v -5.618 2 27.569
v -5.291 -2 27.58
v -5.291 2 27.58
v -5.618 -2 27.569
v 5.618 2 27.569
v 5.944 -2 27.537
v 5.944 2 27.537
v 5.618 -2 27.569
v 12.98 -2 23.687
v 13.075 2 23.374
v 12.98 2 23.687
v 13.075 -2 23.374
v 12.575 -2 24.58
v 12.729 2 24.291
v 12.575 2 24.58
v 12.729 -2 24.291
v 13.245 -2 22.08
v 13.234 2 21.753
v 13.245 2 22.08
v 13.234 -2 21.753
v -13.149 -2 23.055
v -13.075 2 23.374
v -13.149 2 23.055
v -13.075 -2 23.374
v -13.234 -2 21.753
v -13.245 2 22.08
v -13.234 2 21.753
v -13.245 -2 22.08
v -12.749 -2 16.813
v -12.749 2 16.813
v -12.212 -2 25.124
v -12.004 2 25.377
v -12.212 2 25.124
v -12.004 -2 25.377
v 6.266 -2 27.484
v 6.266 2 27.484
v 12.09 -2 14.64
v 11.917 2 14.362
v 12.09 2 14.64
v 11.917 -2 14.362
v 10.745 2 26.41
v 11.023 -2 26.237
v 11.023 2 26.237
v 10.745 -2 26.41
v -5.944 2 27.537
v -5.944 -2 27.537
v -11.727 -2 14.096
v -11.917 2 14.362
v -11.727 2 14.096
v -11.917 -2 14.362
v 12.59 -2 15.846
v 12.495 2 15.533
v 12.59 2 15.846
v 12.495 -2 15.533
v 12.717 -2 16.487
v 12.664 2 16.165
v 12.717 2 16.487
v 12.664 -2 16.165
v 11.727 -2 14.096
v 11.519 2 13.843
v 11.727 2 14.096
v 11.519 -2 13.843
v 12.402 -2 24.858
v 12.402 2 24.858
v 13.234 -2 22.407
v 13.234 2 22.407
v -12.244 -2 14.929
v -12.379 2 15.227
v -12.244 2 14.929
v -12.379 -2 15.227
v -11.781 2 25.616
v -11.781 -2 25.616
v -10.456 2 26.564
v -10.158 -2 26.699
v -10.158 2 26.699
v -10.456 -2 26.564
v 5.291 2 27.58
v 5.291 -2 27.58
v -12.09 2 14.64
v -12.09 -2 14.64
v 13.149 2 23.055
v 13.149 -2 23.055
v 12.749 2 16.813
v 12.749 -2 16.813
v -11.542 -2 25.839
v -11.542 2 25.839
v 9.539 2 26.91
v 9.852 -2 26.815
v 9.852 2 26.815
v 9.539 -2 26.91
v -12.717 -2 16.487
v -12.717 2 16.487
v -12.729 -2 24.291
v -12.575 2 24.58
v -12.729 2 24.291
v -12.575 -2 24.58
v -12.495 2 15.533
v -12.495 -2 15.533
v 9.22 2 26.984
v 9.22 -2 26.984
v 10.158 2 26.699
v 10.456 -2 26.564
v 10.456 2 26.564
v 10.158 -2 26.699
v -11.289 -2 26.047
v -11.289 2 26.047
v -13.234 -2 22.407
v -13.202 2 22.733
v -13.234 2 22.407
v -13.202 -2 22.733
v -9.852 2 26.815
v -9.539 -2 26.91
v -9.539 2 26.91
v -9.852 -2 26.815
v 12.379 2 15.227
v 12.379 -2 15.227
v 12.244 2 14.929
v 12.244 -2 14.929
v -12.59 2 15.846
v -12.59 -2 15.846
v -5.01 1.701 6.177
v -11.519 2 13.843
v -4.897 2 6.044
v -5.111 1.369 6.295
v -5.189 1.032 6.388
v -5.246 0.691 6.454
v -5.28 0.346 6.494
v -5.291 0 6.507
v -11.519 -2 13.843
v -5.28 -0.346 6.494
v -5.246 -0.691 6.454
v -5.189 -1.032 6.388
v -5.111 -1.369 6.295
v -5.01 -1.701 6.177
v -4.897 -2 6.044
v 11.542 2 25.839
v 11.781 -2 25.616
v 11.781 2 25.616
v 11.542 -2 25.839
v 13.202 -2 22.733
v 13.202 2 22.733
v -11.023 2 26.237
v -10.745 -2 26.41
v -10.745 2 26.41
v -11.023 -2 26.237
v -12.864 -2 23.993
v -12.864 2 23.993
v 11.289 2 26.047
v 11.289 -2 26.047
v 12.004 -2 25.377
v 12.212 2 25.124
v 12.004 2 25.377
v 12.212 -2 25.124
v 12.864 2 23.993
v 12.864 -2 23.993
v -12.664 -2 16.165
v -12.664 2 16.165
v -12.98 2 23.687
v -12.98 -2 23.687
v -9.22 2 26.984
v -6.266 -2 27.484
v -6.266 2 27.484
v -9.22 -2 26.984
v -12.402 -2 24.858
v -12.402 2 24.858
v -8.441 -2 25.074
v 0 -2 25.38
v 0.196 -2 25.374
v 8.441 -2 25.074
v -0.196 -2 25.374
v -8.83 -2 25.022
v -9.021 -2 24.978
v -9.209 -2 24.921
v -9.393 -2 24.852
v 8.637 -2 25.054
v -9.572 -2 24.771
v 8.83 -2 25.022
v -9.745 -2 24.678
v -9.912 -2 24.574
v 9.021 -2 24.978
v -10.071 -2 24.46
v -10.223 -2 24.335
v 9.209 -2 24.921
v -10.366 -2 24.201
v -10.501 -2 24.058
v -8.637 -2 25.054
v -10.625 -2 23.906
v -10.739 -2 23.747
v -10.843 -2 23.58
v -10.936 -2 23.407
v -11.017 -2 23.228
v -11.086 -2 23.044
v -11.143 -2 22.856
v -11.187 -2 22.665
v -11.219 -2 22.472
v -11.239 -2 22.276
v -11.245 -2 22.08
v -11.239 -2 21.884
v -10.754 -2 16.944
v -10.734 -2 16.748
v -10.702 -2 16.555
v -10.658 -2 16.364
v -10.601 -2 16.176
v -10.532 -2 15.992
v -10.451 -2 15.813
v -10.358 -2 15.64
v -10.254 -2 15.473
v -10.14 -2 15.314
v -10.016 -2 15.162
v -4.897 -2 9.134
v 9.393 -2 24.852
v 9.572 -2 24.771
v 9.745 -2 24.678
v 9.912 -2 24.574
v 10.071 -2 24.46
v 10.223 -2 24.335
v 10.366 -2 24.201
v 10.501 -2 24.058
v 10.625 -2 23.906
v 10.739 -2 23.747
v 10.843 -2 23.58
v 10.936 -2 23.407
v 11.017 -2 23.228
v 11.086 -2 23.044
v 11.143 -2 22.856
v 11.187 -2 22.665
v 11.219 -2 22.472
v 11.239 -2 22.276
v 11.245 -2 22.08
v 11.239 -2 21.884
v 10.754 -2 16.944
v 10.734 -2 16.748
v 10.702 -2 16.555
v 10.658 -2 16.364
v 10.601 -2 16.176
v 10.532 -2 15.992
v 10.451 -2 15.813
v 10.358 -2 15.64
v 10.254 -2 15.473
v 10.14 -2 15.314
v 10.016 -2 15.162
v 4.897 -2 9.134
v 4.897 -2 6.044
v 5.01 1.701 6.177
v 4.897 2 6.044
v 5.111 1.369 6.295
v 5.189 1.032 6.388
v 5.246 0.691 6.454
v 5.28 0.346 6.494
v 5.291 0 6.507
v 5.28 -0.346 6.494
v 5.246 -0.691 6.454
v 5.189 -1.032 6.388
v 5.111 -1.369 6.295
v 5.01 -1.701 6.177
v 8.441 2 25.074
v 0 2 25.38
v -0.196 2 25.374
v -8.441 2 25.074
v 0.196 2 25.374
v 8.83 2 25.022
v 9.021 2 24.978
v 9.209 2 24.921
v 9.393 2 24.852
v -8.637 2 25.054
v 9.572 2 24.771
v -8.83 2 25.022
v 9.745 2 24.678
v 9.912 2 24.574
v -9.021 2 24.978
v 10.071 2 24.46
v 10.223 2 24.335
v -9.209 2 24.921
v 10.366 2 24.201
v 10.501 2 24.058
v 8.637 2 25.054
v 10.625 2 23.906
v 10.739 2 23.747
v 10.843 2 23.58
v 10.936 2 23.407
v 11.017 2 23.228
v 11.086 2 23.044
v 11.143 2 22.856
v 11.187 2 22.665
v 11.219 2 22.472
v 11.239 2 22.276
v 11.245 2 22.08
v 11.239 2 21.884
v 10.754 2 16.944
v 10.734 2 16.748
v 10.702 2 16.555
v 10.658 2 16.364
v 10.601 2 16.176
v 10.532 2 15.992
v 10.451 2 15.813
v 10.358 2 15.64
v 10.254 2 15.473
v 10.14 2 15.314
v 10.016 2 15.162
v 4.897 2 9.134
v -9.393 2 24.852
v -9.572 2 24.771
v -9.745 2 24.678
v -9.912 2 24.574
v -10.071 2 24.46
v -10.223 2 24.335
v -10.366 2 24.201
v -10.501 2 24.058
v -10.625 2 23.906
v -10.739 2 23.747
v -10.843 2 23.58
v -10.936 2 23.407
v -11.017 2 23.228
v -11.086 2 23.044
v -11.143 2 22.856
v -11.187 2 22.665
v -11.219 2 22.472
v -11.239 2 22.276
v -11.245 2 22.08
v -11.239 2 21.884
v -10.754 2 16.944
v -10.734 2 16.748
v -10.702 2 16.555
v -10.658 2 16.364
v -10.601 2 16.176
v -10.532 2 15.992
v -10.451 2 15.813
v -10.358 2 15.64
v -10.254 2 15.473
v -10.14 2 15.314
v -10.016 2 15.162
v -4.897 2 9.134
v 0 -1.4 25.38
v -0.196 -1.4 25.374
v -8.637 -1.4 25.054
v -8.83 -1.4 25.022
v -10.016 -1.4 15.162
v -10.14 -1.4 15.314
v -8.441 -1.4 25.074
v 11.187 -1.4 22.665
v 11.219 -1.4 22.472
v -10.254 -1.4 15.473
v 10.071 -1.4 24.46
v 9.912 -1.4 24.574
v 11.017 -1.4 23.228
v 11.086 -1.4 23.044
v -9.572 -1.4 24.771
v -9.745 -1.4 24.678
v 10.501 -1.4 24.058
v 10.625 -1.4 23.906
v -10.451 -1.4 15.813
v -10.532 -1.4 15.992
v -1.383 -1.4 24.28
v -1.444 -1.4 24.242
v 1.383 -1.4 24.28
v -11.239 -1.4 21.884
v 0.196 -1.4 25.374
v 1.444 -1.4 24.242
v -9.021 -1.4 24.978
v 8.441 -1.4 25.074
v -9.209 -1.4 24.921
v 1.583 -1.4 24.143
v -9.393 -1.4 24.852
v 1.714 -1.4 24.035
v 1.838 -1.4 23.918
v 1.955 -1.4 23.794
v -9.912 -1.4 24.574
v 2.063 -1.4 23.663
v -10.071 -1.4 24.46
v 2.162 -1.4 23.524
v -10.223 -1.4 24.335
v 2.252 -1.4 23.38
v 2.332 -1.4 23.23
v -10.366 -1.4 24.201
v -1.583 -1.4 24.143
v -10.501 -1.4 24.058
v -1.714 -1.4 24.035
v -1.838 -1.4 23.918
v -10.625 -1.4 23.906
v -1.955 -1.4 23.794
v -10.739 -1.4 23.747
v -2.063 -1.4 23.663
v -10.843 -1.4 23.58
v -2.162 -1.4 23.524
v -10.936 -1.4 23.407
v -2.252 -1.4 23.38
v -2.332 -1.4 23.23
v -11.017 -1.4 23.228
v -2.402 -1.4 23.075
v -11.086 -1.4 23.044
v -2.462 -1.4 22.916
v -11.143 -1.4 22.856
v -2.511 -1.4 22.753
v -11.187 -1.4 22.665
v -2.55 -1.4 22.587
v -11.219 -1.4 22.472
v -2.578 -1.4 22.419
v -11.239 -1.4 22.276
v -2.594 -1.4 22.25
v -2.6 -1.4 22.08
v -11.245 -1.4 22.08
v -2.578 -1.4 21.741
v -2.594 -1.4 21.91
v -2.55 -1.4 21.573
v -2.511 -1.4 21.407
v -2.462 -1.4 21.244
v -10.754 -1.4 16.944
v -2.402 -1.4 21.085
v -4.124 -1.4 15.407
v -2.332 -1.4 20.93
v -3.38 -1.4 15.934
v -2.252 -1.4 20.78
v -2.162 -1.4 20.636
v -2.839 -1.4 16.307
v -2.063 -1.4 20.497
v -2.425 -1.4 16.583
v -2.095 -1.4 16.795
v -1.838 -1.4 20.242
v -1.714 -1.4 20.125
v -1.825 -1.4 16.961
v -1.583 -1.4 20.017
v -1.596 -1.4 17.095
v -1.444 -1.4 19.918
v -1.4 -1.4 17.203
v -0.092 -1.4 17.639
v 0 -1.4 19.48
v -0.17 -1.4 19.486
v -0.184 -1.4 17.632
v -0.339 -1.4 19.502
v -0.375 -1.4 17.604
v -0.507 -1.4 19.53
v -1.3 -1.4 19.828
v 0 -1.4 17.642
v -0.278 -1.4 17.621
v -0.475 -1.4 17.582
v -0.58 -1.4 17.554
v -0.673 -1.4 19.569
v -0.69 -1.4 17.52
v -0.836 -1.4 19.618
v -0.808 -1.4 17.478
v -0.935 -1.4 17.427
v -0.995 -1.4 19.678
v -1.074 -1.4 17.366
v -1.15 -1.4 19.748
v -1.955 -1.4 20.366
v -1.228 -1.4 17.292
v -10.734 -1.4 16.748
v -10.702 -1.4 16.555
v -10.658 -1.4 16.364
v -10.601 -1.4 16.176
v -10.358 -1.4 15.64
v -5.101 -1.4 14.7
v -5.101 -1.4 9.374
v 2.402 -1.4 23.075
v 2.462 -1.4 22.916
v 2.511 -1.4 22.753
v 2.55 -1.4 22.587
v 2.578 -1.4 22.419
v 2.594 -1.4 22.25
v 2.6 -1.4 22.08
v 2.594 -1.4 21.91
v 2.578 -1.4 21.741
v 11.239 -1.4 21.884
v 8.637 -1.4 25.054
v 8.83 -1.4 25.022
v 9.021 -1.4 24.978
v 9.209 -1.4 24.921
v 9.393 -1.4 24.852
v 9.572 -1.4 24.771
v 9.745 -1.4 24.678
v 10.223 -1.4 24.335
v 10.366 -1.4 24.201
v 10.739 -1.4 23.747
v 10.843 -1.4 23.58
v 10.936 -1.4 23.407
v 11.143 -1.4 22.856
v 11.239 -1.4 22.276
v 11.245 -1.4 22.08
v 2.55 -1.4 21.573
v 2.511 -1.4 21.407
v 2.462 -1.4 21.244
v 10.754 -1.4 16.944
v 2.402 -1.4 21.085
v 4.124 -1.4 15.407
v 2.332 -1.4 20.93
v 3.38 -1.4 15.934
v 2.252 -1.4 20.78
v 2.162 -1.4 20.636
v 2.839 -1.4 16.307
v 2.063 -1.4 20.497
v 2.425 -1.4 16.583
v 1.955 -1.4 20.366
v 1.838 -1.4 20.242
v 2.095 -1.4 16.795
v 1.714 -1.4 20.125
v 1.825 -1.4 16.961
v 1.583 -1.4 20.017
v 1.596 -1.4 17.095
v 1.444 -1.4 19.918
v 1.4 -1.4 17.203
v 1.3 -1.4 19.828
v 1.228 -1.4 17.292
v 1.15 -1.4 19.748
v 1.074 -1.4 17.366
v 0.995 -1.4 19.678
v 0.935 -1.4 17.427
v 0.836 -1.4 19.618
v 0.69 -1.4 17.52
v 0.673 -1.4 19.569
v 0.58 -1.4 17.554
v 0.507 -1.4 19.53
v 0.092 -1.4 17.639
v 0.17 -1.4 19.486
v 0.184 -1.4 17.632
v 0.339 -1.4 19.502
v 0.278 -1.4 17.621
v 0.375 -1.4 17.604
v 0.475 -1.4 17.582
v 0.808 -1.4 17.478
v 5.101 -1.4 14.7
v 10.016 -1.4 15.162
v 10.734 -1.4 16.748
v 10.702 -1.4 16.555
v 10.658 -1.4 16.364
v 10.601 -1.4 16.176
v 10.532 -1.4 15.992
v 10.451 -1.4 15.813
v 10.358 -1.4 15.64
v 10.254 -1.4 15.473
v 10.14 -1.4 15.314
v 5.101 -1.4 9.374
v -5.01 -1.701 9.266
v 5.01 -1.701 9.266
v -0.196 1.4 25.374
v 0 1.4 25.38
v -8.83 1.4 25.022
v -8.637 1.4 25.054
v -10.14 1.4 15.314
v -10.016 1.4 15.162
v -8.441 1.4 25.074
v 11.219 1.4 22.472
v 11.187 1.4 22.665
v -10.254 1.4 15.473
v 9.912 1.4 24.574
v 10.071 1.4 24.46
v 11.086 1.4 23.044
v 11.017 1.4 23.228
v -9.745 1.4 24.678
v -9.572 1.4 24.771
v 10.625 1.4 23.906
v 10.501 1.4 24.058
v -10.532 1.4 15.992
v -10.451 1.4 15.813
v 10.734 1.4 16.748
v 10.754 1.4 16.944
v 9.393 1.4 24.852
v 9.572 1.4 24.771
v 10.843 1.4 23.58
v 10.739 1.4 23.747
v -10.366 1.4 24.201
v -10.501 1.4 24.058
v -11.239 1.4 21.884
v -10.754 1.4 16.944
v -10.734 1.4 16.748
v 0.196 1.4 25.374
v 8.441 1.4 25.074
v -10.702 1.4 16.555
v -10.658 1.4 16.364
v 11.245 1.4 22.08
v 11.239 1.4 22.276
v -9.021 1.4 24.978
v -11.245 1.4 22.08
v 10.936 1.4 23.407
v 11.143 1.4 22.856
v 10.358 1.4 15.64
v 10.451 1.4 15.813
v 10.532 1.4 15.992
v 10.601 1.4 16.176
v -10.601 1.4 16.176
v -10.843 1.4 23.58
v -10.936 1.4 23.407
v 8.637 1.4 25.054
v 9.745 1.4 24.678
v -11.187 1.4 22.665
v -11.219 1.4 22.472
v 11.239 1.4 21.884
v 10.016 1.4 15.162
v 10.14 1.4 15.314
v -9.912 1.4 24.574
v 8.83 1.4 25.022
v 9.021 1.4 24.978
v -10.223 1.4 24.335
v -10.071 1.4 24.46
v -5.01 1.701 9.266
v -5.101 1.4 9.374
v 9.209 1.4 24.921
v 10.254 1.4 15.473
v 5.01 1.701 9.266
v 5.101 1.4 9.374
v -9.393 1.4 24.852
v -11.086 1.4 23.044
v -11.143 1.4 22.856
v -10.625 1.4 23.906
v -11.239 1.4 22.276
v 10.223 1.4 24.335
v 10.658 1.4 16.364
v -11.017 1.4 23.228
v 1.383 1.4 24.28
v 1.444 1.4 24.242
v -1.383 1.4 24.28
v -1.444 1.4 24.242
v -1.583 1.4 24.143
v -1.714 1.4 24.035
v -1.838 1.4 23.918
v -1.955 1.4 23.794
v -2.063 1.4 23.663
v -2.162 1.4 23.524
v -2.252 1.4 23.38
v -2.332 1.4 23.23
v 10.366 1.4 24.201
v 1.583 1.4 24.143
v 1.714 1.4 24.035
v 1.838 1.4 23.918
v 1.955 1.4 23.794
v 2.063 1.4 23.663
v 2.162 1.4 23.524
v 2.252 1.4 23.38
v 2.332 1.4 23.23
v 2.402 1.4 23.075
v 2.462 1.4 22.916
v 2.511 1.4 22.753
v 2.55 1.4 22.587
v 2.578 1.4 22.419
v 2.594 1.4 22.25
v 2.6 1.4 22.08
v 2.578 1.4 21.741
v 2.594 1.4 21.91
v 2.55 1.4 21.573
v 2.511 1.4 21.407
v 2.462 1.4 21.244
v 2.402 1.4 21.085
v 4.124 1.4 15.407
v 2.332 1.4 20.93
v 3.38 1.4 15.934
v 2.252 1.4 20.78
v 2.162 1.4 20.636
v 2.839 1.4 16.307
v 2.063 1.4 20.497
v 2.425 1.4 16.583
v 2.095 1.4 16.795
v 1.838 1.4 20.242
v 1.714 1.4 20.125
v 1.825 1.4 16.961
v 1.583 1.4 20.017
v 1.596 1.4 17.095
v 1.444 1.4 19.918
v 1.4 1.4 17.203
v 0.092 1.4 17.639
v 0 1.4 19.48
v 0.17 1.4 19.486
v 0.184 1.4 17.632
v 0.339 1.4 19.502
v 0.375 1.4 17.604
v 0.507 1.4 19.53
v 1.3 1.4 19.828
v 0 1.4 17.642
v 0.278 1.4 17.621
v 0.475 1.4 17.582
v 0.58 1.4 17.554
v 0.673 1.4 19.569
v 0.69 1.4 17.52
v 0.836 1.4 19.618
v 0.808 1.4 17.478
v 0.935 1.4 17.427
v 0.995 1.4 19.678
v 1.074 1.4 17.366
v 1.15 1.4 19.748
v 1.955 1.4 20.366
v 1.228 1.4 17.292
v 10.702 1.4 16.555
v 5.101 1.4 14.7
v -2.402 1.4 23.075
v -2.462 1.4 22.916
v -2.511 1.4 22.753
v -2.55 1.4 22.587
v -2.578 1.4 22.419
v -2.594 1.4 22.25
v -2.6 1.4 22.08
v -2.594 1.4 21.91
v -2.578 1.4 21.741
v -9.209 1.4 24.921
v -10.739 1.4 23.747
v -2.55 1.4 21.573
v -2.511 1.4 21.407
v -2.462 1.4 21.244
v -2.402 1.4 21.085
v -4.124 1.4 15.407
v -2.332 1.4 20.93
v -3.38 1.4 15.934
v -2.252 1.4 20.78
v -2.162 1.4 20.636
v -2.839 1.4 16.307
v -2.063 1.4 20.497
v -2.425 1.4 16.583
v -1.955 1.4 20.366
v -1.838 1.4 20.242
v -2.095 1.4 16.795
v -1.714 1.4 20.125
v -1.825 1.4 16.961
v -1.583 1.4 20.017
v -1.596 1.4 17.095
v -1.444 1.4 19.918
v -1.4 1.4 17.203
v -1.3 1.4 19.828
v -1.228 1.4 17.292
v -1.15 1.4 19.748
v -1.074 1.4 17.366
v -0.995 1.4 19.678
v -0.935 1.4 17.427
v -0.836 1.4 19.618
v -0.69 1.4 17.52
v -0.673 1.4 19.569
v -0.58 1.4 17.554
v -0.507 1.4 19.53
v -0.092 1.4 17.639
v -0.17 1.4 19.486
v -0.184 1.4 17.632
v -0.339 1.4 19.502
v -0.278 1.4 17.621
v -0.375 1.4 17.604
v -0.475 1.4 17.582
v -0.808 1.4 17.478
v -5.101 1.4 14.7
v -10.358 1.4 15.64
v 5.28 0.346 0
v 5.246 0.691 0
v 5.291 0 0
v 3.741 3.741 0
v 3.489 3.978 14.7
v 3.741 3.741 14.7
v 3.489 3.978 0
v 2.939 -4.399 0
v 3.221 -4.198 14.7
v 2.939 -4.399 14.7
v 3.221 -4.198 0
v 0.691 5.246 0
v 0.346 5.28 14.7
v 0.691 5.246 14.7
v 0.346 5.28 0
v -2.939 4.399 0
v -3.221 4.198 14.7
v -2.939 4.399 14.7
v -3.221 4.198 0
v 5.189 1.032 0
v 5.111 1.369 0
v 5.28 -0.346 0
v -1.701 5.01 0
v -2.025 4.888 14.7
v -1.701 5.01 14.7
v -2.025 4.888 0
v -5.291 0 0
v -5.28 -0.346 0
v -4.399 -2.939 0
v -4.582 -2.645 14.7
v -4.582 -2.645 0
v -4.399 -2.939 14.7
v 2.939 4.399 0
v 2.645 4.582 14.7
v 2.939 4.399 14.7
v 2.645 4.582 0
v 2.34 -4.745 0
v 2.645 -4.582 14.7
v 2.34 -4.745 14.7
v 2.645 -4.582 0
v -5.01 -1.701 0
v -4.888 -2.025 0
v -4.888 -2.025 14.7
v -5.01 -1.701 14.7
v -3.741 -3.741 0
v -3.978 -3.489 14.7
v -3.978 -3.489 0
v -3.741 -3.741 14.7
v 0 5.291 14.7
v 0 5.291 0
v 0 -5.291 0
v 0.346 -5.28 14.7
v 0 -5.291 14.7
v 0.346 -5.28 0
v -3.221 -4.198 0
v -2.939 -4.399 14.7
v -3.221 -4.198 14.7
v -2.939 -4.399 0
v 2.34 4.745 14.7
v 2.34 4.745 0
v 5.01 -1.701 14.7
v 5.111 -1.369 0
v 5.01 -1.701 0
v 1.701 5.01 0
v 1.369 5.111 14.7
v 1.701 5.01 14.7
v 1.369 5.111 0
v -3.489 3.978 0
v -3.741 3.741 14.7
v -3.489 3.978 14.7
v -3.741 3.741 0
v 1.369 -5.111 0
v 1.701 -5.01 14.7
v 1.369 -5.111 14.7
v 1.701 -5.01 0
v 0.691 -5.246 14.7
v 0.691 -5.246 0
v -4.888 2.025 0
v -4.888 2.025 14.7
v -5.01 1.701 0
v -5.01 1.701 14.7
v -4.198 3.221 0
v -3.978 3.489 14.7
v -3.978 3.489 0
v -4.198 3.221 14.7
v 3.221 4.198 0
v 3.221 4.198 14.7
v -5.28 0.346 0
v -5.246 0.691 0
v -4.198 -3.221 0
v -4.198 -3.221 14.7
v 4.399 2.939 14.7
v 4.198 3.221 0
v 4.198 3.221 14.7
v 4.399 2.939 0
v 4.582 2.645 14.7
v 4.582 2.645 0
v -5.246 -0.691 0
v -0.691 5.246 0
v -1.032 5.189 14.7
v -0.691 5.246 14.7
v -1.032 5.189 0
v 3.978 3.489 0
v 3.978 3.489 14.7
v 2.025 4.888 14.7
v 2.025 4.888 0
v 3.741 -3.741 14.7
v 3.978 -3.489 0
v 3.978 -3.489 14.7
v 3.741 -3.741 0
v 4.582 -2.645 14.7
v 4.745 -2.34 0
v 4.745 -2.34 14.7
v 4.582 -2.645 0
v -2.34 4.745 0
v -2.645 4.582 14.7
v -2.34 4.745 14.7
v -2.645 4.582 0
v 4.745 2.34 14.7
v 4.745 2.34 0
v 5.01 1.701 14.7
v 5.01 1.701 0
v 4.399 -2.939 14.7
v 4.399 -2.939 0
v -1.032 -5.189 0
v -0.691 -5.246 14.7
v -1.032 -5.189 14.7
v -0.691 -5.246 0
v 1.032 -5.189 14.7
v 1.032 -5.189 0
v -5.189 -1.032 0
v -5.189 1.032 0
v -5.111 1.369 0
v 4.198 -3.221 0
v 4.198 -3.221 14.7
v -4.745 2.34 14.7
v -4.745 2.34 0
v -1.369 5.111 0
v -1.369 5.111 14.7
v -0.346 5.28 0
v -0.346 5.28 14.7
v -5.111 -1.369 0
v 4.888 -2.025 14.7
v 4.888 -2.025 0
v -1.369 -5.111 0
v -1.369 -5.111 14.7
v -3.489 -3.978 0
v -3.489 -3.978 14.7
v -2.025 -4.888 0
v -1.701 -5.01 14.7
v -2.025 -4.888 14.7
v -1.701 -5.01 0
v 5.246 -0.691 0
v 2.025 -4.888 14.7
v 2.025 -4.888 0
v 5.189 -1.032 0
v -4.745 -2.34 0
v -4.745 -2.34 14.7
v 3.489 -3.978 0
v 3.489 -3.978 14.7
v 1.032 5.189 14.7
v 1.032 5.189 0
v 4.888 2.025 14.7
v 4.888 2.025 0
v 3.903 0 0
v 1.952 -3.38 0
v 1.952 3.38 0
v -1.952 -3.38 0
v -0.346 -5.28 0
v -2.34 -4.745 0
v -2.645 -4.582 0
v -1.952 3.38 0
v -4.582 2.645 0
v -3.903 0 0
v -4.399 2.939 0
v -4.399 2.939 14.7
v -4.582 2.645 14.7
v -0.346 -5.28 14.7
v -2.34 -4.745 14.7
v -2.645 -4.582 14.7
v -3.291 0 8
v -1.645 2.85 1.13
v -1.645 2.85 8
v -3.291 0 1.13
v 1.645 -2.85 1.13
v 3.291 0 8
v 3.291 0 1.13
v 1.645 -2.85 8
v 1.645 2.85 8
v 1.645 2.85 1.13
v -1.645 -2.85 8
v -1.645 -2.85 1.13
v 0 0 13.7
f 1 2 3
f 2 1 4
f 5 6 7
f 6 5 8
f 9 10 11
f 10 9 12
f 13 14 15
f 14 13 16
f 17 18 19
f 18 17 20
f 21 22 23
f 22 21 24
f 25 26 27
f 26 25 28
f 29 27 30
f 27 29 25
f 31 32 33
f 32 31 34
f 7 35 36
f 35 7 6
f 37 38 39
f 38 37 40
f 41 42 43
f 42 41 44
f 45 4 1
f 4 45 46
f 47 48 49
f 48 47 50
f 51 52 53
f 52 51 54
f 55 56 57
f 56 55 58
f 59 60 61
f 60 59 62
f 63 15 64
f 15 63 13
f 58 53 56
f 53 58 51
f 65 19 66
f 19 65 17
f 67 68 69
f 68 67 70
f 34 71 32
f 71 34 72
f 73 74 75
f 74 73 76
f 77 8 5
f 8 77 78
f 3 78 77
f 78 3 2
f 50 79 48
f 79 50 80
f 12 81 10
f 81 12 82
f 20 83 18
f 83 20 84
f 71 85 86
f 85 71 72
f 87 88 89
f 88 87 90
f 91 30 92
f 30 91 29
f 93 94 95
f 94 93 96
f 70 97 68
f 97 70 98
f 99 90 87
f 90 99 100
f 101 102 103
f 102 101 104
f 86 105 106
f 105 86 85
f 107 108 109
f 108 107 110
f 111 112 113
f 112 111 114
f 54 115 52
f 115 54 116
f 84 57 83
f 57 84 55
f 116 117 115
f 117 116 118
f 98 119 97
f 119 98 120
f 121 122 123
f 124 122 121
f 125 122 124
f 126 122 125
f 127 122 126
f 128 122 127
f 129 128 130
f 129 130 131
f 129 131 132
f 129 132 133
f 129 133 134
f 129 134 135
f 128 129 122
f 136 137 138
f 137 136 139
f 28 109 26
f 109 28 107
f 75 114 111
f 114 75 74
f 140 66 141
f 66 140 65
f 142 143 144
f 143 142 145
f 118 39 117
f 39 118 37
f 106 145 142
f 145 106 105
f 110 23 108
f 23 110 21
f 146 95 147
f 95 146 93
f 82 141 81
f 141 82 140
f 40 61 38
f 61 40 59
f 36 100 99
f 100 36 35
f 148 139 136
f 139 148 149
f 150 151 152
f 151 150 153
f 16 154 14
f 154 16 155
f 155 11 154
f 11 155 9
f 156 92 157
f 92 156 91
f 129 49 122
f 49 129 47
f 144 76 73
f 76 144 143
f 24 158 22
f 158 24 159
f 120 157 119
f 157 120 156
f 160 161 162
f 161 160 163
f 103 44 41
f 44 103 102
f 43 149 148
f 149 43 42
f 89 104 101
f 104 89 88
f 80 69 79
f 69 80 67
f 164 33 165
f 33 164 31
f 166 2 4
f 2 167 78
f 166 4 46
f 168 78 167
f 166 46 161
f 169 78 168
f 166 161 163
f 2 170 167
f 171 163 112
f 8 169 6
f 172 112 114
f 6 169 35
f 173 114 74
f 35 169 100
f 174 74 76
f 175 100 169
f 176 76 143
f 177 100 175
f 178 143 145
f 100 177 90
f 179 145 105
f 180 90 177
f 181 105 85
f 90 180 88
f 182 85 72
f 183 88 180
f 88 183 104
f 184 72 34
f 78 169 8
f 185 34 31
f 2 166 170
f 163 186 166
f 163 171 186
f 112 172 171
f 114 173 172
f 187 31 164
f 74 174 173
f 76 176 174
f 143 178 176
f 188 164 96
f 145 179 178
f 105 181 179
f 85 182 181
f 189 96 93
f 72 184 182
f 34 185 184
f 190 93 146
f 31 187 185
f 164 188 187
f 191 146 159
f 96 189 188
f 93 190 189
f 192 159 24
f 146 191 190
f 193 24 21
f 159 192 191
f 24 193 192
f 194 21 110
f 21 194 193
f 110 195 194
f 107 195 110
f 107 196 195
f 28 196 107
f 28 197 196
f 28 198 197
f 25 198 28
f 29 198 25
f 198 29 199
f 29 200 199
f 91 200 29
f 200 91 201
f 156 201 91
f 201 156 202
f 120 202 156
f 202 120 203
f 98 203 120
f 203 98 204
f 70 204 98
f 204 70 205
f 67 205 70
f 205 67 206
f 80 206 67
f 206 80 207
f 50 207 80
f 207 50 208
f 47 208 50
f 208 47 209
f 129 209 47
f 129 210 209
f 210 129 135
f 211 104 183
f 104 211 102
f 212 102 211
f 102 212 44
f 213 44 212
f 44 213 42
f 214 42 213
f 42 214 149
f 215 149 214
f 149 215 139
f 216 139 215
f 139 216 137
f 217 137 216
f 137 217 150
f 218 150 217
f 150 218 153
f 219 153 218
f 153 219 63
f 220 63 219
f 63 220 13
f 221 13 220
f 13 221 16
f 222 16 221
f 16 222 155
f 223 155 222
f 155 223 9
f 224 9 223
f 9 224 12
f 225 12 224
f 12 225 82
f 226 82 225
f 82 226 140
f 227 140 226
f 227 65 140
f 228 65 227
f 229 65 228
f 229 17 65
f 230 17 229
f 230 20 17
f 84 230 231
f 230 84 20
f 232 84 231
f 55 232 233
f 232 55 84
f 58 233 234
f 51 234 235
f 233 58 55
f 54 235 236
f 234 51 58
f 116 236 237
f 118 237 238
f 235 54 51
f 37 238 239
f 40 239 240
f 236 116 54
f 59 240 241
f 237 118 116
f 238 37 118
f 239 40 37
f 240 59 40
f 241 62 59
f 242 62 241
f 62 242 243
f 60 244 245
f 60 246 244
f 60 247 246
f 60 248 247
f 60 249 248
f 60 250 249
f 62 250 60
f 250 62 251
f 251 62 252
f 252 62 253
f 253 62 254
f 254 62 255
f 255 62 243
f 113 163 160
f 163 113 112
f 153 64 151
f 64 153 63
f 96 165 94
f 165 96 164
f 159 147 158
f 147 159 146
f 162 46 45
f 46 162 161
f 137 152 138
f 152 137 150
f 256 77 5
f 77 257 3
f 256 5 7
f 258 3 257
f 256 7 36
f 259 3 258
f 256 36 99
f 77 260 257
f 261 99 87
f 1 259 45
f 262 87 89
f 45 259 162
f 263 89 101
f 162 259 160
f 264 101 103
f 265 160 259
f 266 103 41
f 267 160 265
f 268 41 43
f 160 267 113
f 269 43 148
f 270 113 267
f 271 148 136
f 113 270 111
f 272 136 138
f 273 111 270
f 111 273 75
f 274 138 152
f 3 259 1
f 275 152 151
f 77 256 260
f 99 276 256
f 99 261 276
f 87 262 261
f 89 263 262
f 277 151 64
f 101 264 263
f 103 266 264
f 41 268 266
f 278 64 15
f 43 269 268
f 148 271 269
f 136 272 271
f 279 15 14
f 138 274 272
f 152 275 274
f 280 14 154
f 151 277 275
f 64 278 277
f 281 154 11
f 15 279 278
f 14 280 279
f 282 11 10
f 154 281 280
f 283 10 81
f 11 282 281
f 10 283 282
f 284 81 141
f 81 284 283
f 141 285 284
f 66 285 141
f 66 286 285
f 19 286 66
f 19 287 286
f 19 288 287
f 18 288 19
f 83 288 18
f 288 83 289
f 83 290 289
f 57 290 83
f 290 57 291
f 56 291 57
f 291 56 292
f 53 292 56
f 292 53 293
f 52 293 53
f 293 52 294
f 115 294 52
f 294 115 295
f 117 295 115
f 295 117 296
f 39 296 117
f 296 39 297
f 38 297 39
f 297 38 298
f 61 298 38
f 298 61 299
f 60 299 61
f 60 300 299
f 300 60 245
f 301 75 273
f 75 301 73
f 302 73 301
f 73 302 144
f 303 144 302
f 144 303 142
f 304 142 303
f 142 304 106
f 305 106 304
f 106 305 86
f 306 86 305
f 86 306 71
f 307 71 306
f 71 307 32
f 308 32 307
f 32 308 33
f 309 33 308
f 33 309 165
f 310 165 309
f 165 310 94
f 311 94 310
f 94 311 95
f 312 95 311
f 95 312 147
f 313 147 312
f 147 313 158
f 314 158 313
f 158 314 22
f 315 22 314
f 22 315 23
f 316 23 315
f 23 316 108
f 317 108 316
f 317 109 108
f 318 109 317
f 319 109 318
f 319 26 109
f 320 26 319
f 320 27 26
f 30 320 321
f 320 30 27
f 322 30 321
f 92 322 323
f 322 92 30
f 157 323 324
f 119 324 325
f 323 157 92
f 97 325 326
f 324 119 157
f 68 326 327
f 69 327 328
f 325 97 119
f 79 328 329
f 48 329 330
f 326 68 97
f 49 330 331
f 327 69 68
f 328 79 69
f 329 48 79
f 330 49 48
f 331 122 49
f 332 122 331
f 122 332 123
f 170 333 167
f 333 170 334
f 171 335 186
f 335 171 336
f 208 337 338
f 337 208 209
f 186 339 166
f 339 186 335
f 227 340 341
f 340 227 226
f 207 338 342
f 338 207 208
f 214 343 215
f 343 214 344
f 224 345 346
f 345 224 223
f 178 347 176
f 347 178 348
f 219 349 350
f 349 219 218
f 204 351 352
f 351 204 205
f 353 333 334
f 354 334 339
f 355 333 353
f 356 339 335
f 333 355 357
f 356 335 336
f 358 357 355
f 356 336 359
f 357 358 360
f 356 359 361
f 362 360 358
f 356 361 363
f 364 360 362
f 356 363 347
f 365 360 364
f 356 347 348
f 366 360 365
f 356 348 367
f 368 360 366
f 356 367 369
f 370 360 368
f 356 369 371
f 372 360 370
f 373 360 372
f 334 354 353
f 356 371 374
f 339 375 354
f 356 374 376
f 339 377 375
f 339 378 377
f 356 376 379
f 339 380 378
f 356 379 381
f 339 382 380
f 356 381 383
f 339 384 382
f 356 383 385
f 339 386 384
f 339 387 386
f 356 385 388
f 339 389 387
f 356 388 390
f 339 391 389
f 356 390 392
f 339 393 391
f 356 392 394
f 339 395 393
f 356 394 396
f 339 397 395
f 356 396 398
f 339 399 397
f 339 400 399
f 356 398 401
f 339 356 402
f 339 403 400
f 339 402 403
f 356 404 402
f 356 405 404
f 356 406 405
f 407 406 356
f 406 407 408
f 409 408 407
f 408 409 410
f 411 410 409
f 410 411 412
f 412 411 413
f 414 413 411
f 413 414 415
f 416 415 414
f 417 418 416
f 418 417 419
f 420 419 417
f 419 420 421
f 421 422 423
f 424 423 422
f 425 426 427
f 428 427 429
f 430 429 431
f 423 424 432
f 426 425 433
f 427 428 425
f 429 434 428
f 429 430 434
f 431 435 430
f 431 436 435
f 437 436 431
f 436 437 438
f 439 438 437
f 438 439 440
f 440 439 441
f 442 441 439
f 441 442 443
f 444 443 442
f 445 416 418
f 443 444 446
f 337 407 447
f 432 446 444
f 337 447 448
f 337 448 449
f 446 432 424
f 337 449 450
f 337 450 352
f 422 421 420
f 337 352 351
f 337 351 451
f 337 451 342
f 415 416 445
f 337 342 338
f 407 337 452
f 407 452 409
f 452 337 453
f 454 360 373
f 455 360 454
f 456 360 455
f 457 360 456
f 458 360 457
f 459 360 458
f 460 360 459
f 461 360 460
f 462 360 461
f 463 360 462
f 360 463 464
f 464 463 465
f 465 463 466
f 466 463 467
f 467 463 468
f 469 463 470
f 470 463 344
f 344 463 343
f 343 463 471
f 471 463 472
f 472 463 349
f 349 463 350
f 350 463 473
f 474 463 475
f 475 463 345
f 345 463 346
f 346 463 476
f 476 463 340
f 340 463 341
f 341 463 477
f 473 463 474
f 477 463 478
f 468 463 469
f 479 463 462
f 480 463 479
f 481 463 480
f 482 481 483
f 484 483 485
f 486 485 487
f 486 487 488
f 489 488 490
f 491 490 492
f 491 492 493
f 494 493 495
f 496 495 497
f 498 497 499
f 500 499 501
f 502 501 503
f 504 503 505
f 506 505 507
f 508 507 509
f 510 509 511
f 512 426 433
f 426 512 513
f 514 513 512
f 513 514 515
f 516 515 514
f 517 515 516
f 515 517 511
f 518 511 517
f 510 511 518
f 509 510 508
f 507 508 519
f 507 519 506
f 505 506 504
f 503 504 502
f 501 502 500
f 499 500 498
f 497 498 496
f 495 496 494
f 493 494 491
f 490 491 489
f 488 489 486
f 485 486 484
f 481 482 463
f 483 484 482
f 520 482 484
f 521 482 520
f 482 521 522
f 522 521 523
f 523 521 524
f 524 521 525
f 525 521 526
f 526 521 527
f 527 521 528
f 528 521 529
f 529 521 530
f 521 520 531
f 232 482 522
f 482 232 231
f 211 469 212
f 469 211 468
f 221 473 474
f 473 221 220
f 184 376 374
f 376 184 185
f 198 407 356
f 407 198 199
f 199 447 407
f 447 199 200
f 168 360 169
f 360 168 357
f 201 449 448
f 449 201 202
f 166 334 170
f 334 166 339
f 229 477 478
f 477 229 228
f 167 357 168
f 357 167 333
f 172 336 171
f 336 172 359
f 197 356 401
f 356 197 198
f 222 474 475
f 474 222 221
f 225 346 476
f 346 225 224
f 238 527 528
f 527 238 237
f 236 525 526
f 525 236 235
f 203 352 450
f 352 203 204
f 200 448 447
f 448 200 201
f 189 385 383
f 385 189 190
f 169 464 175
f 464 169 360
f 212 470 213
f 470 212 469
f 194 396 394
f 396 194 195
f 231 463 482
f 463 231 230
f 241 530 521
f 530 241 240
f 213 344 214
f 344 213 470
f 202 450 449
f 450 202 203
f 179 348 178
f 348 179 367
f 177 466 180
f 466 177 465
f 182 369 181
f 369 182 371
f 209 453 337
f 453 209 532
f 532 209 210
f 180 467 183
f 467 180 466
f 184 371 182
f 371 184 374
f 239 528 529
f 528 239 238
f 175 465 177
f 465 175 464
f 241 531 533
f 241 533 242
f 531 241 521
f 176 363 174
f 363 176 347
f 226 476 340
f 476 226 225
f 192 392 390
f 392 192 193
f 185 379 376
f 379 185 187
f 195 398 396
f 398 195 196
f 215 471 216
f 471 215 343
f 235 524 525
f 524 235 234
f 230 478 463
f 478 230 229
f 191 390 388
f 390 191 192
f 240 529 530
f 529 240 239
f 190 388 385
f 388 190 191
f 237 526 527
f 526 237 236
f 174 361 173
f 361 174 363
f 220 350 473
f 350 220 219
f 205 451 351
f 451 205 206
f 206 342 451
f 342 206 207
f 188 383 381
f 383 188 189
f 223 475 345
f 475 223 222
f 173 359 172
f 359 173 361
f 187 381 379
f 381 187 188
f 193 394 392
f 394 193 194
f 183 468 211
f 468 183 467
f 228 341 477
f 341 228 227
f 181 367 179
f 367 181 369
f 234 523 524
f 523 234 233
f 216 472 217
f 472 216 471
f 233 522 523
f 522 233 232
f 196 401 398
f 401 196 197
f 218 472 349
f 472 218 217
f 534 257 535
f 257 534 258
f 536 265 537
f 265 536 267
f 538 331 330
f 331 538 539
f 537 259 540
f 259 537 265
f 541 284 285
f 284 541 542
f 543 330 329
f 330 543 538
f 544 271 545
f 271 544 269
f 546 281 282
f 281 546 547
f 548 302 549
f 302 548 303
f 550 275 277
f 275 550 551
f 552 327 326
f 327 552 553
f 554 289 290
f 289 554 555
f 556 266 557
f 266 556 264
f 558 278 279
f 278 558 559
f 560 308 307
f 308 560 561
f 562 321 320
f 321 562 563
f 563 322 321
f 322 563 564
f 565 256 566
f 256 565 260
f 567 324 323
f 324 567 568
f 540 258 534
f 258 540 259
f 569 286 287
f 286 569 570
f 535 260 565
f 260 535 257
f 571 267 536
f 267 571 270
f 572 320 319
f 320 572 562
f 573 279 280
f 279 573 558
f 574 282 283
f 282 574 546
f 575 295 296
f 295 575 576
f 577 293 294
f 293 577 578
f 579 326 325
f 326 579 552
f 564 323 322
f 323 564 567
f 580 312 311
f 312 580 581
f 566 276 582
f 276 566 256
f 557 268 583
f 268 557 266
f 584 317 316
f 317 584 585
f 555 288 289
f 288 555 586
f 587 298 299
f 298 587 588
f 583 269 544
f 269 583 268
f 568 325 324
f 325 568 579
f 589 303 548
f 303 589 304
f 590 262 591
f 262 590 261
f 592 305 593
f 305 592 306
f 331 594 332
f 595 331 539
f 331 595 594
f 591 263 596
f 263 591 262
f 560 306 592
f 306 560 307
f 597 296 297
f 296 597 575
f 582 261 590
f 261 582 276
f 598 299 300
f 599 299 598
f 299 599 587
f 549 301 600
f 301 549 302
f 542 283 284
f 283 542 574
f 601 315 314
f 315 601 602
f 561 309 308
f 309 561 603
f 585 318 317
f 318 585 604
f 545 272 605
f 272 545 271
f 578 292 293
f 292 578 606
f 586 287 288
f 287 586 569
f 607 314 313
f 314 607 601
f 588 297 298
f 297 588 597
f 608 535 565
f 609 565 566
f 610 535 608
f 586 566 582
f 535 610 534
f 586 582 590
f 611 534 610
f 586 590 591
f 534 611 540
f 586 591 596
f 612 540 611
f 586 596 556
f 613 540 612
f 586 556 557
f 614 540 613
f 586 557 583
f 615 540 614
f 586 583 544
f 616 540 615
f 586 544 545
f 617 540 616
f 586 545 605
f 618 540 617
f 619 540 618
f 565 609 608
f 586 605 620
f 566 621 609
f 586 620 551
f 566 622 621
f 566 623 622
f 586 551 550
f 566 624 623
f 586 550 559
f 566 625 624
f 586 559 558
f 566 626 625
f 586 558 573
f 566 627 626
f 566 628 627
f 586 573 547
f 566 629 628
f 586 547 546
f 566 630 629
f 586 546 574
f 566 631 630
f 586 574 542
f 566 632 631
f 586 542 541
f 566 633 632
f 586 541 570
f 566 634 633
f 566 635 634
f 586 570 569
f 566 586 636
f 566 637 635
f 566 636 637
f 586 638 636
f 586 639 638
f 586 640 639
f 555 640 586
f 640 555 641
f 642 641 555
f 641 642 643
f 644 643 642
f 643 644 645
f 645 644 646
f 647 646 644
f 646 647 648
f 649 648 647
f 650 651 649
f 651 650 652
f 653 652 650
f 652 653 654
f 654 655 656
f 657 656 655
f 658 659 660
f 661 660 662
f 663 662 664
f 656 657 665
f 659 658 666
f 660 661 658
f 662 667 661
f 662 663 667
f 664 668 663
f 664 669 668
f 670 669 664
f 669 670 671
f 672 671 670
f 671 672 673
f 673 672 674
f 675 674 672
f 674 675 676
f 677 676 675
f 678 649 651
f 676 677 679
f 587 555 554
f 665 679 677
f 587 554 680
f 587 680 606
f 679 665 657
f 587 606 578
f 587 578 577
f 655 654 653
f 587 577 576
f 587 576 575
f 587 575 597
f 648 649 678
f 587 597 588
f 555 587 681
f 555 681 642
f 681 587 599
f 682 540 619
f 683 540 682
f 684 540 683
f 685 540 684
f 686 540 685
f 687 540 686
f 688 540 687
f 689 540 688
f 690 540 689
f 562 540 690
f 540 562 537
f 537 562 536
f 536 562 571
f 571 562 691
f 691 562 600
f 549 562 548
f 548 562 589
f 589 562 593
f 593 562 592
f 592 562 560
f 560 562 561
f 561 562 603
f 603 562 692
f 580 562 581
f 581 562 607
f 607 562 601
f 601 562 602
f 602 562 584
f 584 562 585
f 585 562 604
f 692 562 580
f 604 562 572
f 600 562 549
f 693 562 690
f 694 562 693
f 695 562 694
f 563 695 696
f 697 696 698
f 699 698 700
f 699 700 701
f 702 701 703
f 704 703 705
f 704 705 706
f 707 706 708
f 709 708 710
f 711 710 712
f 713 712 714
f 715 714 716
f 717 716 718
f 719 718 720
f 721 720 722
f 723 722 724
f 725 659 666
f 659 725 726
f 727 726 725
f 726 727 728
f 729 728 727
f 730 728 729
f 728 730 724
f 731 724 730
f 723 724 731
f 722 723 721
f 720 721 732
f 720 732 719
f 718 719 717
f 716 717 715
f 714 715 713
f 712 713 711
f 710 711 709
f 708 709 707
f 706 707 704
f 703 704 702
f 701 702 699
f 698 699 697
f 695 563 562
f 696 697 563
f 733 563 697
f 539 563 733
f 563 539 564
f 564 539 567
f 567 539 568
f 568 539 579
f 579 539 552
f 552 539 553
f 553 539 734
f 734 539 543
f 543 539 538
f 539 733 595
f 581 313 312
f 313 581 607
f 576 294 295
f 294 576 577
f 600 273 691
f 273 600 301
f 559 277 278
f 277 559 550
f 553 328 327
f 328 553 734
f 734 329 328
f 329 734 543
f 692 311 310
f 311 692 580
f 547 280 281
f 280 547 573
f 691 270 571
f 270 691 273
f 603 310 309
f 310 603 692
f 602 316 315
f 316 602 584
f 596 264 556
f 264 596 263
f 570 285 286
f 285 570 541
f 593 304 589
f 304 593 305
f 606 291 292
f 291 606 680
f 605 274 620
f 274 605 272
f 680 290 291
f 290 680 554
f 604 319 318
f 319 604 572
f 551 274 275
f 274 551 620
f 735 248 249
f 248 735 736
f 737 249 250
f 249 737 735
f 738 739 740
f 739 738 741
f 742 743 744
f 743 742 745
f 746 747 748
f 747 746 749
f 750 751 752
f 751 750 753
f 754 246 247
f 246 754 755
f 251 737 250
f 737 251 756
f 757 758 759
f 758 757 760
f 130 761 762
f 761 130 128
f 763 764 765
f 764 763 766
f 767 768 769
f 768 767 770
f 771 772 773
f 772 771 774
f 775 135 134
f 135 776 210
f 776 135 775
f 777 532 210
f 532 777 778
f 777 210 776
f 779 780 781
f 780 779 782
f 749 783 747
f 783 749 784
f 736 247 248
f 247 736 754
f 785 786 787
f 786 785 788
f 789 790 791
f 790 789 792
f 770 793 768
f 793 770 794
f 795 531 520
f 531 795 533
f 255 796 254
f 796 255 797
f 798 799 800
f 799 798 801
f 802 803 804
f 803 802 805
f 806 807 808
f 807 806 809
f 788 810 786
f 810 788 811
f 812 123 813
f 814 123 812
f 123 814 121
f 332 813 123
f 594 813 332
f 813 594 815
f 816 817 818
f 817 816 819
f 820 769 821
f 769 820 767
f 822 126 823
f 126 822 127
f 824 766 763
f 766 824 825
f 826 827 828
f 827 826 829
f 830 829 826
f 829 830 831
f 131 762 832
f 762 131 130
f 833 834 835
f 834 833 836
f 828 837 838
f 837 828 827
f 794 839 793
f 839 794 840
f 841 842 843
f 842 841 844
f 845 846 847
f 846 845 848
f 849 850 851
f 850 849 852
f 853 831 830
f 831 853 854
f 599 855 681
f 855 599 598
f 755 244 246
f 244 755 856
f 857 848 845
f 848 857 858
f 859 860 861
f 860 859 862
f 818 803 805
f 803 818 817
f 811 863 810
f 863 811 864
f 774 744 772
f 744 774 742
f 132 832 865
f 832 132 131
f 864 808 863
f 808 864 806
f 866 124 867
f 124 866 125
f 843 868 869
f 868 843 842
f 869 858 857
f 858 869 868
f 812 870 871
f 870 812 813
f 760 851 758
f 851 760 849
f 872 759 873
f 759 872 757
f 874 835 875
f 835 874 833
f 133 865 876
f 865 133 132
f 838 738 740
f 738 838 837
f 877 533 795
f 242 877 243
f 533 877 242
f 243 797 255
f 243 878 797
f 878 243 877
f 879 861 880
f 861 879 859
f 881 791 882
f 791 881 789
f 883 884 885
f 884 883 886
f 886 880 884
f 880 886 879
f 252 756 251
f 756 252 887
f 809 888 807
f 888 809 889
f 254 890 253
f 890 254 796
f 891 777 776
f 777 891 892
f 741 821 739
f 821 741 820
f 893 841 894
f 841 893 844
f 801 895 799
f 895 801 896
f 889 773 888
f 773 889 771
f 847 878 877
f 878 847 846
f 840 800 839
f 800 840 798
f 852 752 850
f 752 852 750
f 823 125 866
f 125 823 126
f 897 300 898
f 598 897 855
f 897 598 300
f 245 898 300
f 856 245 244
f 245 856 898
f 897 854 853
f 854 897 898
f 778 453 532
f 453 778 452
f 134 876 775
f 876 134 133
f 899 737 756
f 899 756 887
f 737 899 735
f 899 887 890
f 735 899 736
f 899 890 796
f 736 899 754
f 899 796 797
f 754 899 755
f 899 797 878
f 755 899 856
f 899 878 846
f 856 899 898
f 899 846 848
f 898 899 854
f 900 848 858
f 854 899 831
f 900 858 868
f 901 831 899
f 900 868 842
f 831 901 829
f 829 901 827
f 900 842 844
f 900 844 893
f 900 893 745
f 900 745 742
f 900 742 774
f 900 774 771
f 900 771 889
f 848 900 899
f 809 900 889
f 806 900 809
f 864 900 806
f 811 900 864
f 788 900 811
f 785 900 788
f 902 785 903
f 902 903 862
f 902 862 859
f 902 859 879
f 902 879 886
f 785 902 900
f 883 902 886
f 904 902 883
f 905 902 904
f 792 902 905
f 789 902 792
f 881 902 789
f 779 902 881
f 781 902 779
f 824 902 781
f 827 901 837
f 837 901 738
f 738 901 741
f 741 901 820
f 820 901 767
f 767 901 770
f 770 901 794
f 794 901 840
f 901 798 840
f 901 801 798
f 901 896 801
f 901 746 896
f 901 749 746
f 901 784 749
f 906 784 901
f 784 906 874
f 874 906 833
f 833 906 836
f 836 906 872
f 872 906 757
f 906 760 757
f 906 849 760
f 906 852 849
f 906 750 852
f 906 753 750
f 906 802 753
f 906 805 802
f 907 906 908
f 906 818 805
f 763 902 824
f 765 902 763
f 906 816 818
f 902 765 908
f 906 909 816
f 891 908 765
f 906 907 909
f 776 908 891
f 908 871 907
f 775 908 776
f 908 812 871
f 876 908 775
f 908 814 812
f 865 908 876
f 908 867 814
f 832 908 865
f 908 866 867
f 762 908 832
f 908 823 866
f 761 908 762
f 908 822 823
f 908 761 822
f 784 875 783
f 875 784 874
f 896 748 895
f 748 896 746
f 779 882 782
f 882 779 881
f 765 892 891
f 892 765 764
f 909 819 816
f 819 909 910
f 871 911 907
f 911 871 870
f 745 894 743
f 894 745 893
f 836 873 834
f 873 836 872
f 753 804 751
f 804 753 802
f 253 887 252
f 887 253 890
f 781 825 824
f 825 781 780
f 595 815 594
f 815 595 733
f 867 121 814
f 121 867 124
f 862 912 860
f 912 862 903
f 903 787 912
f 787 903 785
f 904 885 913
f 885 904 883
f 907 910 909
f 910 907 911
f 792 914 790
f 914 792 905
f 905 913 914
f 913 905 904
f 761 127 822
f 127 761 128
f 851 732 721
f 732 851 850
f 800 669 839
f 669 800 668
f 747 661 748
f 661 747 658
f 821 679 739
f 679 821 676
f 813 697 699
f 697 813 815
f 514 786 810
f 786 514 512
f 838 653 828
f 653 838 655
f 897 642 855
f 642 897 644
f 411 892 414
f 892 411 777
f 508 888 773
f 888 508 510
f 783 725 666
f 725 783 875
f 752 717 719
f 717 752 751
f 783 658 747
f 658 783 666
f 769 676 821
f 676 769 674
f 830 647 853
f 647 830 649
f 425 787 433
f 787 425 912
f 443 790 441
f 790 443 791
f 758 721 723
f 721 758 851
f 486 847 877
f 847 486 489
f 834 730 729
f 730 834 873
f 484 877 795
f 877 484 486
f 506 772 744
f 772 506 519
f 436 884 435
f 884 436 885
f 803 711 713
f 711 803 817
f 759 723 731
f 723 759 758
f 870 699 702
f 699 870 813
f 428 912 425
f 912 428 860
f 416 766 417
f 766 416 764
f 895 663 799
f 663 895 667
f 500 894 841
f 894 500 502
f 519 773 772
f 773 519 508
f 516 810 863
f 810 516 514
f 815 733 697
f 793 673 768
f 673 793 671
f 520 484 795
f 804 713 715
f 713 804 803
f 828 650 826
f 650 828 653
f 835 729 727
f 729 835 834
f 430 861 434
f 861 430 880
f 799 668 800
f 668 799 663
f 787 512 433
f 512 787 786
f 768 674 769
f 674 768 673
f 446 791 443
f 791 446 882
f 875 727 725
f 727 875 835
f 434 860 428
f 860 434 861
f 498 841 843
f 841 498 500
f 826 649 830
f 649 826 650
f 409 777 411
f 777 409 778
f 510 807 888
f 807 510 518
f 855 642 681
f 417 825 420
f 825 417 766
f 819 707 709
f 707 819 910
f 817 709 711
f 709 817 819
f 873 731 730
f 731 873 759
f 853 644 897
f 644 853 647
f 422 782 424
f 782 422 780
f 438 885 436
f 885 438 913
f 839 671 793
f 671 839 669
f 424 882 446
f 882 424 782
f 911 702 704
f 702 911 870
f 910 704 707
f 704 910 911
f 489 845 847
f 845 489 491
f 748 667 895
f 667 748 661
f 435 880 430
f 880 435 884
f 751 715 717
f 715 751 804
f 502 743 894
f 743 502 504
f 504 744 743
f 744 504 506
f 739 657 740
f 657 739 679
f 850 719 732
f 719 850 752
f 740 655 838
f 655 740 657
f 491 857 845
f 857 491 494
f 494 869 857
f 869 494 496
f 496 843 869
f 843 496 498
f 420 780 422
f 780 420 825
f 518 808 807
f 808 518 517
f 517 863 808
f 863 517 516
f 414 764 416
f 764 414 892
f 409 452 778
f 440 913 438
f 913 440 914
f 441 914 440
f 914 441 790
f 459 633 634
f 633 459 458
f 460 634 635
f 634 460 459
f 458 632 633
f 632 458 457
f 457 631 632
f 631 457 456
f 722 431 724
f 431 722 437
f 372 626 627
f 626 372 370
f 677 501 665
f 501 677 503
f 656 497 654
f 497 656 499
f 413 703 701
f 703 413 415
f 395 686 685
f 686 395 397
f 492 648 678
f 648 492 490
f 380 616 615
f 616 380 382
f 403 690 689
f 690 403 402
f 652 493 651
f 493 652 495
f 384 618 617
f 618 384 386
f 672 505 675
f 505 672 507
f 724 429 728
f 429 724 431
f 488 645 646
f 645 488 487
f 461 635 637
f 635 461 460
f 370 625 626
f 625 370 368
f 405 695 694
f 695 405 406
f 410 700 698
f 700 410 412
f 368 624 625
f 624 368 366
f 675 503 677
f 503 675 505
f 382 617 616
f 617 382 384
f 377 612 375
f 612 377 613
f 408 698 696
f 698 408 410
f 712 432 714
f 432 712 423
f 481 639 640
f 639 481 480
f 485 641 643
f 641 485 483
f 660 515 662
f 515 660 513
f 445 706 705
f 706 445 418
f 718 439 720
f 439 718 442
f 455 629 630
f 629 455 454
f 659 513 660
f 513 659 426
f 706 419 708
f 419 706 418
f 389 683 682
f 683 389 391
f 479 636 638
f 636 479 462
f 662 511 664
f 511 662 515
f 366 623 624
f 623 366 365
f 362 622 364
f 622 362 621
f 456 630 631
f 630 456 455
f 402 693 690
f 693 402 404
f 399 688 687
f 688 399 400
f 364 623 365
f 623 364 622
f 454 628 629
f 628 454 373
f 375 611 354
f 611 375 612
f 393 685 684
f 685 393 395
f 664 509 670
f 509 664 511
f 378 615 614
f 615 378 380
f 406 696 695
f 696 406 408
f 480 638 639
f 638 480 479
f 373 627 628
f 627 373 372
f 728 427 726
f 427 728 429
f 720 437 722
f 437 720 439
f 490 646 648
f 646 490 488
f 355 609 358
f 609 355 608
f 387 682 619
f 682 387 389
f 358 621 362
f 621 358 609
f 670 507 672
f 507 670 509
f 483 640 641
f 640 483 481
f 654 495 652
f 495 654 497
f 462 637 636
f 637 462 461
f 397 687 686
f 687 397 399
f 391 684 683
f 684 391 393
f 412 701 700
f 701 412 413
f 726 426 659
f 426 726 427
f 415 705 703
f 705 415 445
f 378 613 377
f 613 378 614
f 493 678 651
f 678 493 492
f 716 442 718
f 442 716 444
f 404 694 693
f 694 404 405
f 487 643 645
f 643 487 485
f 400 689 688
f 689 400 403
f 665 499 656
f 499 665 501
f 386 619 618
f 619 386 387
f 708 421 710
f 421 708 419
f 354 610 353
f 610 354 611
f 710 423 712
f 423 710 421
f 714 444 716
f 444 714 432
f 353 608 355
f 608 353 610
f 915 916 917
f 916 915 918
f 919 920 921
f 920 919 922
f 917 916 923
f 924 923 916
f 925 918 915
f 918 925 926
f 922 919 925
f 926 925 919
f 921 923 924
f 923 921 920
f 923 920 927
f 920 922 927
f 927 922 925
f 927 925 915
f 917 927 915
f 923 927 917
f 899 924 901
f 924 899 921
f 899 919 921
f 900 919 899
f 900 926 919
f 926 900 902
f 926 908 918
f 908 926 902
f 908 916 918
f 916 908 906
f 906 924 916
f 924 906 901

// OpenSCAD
//  - The number of sides.
hole_sides = 6; // [3:12]

//  - For an even number of sides, this is the perpendicular distance between two opposite, parallel sides. For an odd number of sides, this is the perpendicular distance from the middle of one side to the opposite corner.
hole_diameter = 5.7;

//  - The depth of the hole.
hole_depth = 8; // 4+

//  - Do you need a hole in the handle?
string_hole = 1;//[0:No, 1:Yes]

//  - Minimal outer diameter - use this to make the `trunk' of the key thicker.
min_outer_diameter = 0;

//  - Do you need to add a foot/brim to increase adhesion during printing?
add_foot = 0;//[0:No, 1:Yes]

//  - Which handle style? Numbers 2 & 3 don't look right in Customiser, but render fine!
handle = 1;//[1,2,3]


hole_height = hole_depth + hole_diameter;
w = hole_diameter/2+2;
h = hole_height + 1;

difference()
{
  union()
  {
    cyl_rad_min = diam2rad(hole_diameter, hole_sides) + 2;
    cyl_rad = max(cyl_rad_min, min_outer_diameter/2);
    
   // cyl_top = handle == 2 ? max(1, hole_depth / 6) : 0;
    cyl_top = handle == 1 ? 0 : (handle == 2 ? max(1, hole_depth / 6) : max(0.5, hole_depth / 8));
    cylinder(hole_height + 1, cyl_rad, cyl_rad+cyl_top, $fn = 96);
    
    if(add_foot)
      feet(cyl_rad);
    
    translate([0, 0, hole_height+1])
    if(handle == 1)
      cylinder(4, cyl_rad+cyl_top, 0, $fn = 96);
    else
      cylinder(2, cyl_rad+cyl_top, 0, $fn = 96);
    
    handle_thickness = min(10, max(4, hole_diameter/4+2));

    if(handle == 1)
      handle1(handle_thickness, cyl_rad);
    else if(handle == 2)
      handle2(handle_thickness, cyl_rad);
    else if(handle == 3)
      handle3(handle_thickness, cyl_rad);
  }

  if(string_hole)
    translate([0, 0, handle!=3?1.4*h+1.5:1.2*h+1.0])
      rotate([90])
        difference()
        {
          cylinder(11, 2.6, 2.6, true, $fn = 96);
          translate([0, 2.4, 0])
            cube([5.2, 0.4, 12], true);
        }

  nPrism(hole_sides, hole_diameter, hole_depth);
}


module nPrism(sides, diam, ln)
{
  l  = diam2rad(diam, sides);
  l2 = diam2rad(diam + 2, sides);
  
  linear_extrude(height = ln)
    polygon(points=[for(i=[0:(360/sides):360]) l*[cos(i), sin(i)]]);

  translate([0,0,ln])
    linear_extrude(height = diam, scale = 0)
      polygon(points=[for(i=[0:(360/sides):360]) l*[cos(i), sin(i)]]);

  translate([0,0,-1])
    linear_extrude(height = diam+2.5, scale = 0)
      polygon(points=[for(i=[0:(360/sides):360]) l2*[cos(i), sin(i)]]);
}

module feet(rad)
{
  difference()
  {
    union()
    {
      difference()
      {
        cylinder(0.4, rad+6, rad+6, $fn = 48);
        cylinder(1, rad+1, rad+1, $fn = 48, true);
      }
      
      cnt=(3.141592*rad)/4;
      for(i = [0:(180/cnt):180])
        rotate([0, 0, i])
          translate([-rad-2, -0.5, 0])
            cube([2*rad+4, 1, 0.4]);
    }
  
    cylinder(1, rad-0.1, rad-0.1, $fn = 48, true);
  }
}

module handle1(thickness, cyl_rad)
{
  rotate([90])
    difference()
    {
      linear_extrude(height = thickness, center=true)
        minkowski()
        {
          polygon(points = [[0, hole_depth], [w*1.6, 1.2*h-0.5], [w*1.7, 1.4*h+1.5],[cyl_rad, 1.4*h+2.0], [-cyl_rad, 1.4*h+2.0], [-w*1.7, 1.4*h+1.5], [-w*1.6, 1.2*h-0.5], [0, hole_depth]]);
          circle(min(5, hole_depth), $fn=96);
        }

      translate([0, 0, thickness/2])
      linear_extrude(height = 1.2, center=true)
        minkowski()
        {
          polygon(points = [[0, hole_depth], [w*1.6, 1.2*h-0.5], [w*1.7, 1.4*h+1.5],[0, 1.4*h+1.8], [-w*1.7, 1.4*h+1.5], [-w*1.6, 1.2*h-0.5], [0, hole_depth]]);
          circle(min(5, hole_depth)-2, $fn=96);
        }
        
      translate([0, 0, -thickness/2])
      linear_extrude(height = 1.2, center=true)
        minkowski()
        {
          polygon(points = [[0, hole_depth], [w*1.6, 1.2*h-0.5], [w*1.7, 1.4*h+1.5],[0, 1.4*h+1.8], [-w*1.7, 1.4*h+1.5], [-w*1.6, 1.2*h-0.5], [0, hole_depth]]);
          circle(min(5, hole_depth)-2, $fn=96);
        }
     }
 }


module handle2(thickness, cyl_rad)
{
  rotate([90])
  intersection()
  {
    rotate_extrude(angle=190, $fn = 96)
      rotate([0,0,90])
        difference()
        {
          union()
          {
           polygon(points = [[-thickness/2+1, 0], [thickness/2-1, 0], 
                             [ thickness/2, 1.4*h+1.8+4],
                             [-thickness/2, 1.4*h+1.8+4]]);
           translate([0, 1.4*h+1.8+4])
             circle(thickness/2+0.0, $fn = 96*2);
          }
        }
        
    linear_extrude(height = thickness+2, center=true)
    {
      polygon(points = [[-cyl_rad+0.5, 0],[cyl_rad-0.5, 0],
                     [ 1.5*h+1, 2.8*h+4],
                     [-1.5*h-1, 2.8*h+4]]);
    }
  }
}
 

module handle3(thickness, cyl_rad)
{
  wid = w*1.7*2+min(5, hole_depth) - thickness/2;
  rd = wid*3;
  ht = 1.4*h+7.0;
  r = (w*1.7*2 + min(5, hole_depth)) / 2;
  l = r*r/ht;
  
  difference()
  {
    translate([0, 0, 1.2*h+1-l])
    {
      rotate([180])
        linear_extrude(height = ht-l, scale = 0)
          projection(cut = true)
            translate([0, 0, l])
              rotate([90])
                shape3D(thickness, cyl_rad);
                  
      difference()
      {
        translate([0, 0, l])
          rotate([90])
            shape3D(thickness, cyl_rad);
        
        translate([-(wid+thickness+1)/2, -(thickness+1)/2, -wid])
          cube([wid+thickness+1, thickness+1, wid]);
      }
    }
    translate([0, 0, -ht/2])
      cube([wid, cyl_rad*2, ht], true);
  }
}

module shape3D(thickness, cyl_rad)
{
  wid = w*1.7*2+min(5, hole_depth) - thickness/2;
  rd = wid*3;
  
  rotate_extrude($fn = 96*2)
    difference()
    {
      union()
      {
        square([wid, thickness], true);
        //translate([wid/2, 0])
          //circle(thickness/2, $fn = 96);
        translate([-wid/2, 0])
          circle(thickness/2, $fn = 96);
      }
        
      translate([0, sqrt(rd*rd - wid*wid/4)+thickness/2])
        circle(rd, $fs = 0.5, $fa = 0.1);
      translate([0, -sqrt(rd*rd - wid*wid/4)-thickness/2])
        circle(rd, $fs = 0.5, $fa = 0.1);

      translate([0, -thickness/2])
        square([wid, thickness]);
    }
}

function diam2rad(diam, sides) = isOdd(sides) ? diam/(1 + cos(180/sides)) : diam/ (cos(180/sides) * 2);
function isOdd(t) = (t-(floor(t/2)*2));
